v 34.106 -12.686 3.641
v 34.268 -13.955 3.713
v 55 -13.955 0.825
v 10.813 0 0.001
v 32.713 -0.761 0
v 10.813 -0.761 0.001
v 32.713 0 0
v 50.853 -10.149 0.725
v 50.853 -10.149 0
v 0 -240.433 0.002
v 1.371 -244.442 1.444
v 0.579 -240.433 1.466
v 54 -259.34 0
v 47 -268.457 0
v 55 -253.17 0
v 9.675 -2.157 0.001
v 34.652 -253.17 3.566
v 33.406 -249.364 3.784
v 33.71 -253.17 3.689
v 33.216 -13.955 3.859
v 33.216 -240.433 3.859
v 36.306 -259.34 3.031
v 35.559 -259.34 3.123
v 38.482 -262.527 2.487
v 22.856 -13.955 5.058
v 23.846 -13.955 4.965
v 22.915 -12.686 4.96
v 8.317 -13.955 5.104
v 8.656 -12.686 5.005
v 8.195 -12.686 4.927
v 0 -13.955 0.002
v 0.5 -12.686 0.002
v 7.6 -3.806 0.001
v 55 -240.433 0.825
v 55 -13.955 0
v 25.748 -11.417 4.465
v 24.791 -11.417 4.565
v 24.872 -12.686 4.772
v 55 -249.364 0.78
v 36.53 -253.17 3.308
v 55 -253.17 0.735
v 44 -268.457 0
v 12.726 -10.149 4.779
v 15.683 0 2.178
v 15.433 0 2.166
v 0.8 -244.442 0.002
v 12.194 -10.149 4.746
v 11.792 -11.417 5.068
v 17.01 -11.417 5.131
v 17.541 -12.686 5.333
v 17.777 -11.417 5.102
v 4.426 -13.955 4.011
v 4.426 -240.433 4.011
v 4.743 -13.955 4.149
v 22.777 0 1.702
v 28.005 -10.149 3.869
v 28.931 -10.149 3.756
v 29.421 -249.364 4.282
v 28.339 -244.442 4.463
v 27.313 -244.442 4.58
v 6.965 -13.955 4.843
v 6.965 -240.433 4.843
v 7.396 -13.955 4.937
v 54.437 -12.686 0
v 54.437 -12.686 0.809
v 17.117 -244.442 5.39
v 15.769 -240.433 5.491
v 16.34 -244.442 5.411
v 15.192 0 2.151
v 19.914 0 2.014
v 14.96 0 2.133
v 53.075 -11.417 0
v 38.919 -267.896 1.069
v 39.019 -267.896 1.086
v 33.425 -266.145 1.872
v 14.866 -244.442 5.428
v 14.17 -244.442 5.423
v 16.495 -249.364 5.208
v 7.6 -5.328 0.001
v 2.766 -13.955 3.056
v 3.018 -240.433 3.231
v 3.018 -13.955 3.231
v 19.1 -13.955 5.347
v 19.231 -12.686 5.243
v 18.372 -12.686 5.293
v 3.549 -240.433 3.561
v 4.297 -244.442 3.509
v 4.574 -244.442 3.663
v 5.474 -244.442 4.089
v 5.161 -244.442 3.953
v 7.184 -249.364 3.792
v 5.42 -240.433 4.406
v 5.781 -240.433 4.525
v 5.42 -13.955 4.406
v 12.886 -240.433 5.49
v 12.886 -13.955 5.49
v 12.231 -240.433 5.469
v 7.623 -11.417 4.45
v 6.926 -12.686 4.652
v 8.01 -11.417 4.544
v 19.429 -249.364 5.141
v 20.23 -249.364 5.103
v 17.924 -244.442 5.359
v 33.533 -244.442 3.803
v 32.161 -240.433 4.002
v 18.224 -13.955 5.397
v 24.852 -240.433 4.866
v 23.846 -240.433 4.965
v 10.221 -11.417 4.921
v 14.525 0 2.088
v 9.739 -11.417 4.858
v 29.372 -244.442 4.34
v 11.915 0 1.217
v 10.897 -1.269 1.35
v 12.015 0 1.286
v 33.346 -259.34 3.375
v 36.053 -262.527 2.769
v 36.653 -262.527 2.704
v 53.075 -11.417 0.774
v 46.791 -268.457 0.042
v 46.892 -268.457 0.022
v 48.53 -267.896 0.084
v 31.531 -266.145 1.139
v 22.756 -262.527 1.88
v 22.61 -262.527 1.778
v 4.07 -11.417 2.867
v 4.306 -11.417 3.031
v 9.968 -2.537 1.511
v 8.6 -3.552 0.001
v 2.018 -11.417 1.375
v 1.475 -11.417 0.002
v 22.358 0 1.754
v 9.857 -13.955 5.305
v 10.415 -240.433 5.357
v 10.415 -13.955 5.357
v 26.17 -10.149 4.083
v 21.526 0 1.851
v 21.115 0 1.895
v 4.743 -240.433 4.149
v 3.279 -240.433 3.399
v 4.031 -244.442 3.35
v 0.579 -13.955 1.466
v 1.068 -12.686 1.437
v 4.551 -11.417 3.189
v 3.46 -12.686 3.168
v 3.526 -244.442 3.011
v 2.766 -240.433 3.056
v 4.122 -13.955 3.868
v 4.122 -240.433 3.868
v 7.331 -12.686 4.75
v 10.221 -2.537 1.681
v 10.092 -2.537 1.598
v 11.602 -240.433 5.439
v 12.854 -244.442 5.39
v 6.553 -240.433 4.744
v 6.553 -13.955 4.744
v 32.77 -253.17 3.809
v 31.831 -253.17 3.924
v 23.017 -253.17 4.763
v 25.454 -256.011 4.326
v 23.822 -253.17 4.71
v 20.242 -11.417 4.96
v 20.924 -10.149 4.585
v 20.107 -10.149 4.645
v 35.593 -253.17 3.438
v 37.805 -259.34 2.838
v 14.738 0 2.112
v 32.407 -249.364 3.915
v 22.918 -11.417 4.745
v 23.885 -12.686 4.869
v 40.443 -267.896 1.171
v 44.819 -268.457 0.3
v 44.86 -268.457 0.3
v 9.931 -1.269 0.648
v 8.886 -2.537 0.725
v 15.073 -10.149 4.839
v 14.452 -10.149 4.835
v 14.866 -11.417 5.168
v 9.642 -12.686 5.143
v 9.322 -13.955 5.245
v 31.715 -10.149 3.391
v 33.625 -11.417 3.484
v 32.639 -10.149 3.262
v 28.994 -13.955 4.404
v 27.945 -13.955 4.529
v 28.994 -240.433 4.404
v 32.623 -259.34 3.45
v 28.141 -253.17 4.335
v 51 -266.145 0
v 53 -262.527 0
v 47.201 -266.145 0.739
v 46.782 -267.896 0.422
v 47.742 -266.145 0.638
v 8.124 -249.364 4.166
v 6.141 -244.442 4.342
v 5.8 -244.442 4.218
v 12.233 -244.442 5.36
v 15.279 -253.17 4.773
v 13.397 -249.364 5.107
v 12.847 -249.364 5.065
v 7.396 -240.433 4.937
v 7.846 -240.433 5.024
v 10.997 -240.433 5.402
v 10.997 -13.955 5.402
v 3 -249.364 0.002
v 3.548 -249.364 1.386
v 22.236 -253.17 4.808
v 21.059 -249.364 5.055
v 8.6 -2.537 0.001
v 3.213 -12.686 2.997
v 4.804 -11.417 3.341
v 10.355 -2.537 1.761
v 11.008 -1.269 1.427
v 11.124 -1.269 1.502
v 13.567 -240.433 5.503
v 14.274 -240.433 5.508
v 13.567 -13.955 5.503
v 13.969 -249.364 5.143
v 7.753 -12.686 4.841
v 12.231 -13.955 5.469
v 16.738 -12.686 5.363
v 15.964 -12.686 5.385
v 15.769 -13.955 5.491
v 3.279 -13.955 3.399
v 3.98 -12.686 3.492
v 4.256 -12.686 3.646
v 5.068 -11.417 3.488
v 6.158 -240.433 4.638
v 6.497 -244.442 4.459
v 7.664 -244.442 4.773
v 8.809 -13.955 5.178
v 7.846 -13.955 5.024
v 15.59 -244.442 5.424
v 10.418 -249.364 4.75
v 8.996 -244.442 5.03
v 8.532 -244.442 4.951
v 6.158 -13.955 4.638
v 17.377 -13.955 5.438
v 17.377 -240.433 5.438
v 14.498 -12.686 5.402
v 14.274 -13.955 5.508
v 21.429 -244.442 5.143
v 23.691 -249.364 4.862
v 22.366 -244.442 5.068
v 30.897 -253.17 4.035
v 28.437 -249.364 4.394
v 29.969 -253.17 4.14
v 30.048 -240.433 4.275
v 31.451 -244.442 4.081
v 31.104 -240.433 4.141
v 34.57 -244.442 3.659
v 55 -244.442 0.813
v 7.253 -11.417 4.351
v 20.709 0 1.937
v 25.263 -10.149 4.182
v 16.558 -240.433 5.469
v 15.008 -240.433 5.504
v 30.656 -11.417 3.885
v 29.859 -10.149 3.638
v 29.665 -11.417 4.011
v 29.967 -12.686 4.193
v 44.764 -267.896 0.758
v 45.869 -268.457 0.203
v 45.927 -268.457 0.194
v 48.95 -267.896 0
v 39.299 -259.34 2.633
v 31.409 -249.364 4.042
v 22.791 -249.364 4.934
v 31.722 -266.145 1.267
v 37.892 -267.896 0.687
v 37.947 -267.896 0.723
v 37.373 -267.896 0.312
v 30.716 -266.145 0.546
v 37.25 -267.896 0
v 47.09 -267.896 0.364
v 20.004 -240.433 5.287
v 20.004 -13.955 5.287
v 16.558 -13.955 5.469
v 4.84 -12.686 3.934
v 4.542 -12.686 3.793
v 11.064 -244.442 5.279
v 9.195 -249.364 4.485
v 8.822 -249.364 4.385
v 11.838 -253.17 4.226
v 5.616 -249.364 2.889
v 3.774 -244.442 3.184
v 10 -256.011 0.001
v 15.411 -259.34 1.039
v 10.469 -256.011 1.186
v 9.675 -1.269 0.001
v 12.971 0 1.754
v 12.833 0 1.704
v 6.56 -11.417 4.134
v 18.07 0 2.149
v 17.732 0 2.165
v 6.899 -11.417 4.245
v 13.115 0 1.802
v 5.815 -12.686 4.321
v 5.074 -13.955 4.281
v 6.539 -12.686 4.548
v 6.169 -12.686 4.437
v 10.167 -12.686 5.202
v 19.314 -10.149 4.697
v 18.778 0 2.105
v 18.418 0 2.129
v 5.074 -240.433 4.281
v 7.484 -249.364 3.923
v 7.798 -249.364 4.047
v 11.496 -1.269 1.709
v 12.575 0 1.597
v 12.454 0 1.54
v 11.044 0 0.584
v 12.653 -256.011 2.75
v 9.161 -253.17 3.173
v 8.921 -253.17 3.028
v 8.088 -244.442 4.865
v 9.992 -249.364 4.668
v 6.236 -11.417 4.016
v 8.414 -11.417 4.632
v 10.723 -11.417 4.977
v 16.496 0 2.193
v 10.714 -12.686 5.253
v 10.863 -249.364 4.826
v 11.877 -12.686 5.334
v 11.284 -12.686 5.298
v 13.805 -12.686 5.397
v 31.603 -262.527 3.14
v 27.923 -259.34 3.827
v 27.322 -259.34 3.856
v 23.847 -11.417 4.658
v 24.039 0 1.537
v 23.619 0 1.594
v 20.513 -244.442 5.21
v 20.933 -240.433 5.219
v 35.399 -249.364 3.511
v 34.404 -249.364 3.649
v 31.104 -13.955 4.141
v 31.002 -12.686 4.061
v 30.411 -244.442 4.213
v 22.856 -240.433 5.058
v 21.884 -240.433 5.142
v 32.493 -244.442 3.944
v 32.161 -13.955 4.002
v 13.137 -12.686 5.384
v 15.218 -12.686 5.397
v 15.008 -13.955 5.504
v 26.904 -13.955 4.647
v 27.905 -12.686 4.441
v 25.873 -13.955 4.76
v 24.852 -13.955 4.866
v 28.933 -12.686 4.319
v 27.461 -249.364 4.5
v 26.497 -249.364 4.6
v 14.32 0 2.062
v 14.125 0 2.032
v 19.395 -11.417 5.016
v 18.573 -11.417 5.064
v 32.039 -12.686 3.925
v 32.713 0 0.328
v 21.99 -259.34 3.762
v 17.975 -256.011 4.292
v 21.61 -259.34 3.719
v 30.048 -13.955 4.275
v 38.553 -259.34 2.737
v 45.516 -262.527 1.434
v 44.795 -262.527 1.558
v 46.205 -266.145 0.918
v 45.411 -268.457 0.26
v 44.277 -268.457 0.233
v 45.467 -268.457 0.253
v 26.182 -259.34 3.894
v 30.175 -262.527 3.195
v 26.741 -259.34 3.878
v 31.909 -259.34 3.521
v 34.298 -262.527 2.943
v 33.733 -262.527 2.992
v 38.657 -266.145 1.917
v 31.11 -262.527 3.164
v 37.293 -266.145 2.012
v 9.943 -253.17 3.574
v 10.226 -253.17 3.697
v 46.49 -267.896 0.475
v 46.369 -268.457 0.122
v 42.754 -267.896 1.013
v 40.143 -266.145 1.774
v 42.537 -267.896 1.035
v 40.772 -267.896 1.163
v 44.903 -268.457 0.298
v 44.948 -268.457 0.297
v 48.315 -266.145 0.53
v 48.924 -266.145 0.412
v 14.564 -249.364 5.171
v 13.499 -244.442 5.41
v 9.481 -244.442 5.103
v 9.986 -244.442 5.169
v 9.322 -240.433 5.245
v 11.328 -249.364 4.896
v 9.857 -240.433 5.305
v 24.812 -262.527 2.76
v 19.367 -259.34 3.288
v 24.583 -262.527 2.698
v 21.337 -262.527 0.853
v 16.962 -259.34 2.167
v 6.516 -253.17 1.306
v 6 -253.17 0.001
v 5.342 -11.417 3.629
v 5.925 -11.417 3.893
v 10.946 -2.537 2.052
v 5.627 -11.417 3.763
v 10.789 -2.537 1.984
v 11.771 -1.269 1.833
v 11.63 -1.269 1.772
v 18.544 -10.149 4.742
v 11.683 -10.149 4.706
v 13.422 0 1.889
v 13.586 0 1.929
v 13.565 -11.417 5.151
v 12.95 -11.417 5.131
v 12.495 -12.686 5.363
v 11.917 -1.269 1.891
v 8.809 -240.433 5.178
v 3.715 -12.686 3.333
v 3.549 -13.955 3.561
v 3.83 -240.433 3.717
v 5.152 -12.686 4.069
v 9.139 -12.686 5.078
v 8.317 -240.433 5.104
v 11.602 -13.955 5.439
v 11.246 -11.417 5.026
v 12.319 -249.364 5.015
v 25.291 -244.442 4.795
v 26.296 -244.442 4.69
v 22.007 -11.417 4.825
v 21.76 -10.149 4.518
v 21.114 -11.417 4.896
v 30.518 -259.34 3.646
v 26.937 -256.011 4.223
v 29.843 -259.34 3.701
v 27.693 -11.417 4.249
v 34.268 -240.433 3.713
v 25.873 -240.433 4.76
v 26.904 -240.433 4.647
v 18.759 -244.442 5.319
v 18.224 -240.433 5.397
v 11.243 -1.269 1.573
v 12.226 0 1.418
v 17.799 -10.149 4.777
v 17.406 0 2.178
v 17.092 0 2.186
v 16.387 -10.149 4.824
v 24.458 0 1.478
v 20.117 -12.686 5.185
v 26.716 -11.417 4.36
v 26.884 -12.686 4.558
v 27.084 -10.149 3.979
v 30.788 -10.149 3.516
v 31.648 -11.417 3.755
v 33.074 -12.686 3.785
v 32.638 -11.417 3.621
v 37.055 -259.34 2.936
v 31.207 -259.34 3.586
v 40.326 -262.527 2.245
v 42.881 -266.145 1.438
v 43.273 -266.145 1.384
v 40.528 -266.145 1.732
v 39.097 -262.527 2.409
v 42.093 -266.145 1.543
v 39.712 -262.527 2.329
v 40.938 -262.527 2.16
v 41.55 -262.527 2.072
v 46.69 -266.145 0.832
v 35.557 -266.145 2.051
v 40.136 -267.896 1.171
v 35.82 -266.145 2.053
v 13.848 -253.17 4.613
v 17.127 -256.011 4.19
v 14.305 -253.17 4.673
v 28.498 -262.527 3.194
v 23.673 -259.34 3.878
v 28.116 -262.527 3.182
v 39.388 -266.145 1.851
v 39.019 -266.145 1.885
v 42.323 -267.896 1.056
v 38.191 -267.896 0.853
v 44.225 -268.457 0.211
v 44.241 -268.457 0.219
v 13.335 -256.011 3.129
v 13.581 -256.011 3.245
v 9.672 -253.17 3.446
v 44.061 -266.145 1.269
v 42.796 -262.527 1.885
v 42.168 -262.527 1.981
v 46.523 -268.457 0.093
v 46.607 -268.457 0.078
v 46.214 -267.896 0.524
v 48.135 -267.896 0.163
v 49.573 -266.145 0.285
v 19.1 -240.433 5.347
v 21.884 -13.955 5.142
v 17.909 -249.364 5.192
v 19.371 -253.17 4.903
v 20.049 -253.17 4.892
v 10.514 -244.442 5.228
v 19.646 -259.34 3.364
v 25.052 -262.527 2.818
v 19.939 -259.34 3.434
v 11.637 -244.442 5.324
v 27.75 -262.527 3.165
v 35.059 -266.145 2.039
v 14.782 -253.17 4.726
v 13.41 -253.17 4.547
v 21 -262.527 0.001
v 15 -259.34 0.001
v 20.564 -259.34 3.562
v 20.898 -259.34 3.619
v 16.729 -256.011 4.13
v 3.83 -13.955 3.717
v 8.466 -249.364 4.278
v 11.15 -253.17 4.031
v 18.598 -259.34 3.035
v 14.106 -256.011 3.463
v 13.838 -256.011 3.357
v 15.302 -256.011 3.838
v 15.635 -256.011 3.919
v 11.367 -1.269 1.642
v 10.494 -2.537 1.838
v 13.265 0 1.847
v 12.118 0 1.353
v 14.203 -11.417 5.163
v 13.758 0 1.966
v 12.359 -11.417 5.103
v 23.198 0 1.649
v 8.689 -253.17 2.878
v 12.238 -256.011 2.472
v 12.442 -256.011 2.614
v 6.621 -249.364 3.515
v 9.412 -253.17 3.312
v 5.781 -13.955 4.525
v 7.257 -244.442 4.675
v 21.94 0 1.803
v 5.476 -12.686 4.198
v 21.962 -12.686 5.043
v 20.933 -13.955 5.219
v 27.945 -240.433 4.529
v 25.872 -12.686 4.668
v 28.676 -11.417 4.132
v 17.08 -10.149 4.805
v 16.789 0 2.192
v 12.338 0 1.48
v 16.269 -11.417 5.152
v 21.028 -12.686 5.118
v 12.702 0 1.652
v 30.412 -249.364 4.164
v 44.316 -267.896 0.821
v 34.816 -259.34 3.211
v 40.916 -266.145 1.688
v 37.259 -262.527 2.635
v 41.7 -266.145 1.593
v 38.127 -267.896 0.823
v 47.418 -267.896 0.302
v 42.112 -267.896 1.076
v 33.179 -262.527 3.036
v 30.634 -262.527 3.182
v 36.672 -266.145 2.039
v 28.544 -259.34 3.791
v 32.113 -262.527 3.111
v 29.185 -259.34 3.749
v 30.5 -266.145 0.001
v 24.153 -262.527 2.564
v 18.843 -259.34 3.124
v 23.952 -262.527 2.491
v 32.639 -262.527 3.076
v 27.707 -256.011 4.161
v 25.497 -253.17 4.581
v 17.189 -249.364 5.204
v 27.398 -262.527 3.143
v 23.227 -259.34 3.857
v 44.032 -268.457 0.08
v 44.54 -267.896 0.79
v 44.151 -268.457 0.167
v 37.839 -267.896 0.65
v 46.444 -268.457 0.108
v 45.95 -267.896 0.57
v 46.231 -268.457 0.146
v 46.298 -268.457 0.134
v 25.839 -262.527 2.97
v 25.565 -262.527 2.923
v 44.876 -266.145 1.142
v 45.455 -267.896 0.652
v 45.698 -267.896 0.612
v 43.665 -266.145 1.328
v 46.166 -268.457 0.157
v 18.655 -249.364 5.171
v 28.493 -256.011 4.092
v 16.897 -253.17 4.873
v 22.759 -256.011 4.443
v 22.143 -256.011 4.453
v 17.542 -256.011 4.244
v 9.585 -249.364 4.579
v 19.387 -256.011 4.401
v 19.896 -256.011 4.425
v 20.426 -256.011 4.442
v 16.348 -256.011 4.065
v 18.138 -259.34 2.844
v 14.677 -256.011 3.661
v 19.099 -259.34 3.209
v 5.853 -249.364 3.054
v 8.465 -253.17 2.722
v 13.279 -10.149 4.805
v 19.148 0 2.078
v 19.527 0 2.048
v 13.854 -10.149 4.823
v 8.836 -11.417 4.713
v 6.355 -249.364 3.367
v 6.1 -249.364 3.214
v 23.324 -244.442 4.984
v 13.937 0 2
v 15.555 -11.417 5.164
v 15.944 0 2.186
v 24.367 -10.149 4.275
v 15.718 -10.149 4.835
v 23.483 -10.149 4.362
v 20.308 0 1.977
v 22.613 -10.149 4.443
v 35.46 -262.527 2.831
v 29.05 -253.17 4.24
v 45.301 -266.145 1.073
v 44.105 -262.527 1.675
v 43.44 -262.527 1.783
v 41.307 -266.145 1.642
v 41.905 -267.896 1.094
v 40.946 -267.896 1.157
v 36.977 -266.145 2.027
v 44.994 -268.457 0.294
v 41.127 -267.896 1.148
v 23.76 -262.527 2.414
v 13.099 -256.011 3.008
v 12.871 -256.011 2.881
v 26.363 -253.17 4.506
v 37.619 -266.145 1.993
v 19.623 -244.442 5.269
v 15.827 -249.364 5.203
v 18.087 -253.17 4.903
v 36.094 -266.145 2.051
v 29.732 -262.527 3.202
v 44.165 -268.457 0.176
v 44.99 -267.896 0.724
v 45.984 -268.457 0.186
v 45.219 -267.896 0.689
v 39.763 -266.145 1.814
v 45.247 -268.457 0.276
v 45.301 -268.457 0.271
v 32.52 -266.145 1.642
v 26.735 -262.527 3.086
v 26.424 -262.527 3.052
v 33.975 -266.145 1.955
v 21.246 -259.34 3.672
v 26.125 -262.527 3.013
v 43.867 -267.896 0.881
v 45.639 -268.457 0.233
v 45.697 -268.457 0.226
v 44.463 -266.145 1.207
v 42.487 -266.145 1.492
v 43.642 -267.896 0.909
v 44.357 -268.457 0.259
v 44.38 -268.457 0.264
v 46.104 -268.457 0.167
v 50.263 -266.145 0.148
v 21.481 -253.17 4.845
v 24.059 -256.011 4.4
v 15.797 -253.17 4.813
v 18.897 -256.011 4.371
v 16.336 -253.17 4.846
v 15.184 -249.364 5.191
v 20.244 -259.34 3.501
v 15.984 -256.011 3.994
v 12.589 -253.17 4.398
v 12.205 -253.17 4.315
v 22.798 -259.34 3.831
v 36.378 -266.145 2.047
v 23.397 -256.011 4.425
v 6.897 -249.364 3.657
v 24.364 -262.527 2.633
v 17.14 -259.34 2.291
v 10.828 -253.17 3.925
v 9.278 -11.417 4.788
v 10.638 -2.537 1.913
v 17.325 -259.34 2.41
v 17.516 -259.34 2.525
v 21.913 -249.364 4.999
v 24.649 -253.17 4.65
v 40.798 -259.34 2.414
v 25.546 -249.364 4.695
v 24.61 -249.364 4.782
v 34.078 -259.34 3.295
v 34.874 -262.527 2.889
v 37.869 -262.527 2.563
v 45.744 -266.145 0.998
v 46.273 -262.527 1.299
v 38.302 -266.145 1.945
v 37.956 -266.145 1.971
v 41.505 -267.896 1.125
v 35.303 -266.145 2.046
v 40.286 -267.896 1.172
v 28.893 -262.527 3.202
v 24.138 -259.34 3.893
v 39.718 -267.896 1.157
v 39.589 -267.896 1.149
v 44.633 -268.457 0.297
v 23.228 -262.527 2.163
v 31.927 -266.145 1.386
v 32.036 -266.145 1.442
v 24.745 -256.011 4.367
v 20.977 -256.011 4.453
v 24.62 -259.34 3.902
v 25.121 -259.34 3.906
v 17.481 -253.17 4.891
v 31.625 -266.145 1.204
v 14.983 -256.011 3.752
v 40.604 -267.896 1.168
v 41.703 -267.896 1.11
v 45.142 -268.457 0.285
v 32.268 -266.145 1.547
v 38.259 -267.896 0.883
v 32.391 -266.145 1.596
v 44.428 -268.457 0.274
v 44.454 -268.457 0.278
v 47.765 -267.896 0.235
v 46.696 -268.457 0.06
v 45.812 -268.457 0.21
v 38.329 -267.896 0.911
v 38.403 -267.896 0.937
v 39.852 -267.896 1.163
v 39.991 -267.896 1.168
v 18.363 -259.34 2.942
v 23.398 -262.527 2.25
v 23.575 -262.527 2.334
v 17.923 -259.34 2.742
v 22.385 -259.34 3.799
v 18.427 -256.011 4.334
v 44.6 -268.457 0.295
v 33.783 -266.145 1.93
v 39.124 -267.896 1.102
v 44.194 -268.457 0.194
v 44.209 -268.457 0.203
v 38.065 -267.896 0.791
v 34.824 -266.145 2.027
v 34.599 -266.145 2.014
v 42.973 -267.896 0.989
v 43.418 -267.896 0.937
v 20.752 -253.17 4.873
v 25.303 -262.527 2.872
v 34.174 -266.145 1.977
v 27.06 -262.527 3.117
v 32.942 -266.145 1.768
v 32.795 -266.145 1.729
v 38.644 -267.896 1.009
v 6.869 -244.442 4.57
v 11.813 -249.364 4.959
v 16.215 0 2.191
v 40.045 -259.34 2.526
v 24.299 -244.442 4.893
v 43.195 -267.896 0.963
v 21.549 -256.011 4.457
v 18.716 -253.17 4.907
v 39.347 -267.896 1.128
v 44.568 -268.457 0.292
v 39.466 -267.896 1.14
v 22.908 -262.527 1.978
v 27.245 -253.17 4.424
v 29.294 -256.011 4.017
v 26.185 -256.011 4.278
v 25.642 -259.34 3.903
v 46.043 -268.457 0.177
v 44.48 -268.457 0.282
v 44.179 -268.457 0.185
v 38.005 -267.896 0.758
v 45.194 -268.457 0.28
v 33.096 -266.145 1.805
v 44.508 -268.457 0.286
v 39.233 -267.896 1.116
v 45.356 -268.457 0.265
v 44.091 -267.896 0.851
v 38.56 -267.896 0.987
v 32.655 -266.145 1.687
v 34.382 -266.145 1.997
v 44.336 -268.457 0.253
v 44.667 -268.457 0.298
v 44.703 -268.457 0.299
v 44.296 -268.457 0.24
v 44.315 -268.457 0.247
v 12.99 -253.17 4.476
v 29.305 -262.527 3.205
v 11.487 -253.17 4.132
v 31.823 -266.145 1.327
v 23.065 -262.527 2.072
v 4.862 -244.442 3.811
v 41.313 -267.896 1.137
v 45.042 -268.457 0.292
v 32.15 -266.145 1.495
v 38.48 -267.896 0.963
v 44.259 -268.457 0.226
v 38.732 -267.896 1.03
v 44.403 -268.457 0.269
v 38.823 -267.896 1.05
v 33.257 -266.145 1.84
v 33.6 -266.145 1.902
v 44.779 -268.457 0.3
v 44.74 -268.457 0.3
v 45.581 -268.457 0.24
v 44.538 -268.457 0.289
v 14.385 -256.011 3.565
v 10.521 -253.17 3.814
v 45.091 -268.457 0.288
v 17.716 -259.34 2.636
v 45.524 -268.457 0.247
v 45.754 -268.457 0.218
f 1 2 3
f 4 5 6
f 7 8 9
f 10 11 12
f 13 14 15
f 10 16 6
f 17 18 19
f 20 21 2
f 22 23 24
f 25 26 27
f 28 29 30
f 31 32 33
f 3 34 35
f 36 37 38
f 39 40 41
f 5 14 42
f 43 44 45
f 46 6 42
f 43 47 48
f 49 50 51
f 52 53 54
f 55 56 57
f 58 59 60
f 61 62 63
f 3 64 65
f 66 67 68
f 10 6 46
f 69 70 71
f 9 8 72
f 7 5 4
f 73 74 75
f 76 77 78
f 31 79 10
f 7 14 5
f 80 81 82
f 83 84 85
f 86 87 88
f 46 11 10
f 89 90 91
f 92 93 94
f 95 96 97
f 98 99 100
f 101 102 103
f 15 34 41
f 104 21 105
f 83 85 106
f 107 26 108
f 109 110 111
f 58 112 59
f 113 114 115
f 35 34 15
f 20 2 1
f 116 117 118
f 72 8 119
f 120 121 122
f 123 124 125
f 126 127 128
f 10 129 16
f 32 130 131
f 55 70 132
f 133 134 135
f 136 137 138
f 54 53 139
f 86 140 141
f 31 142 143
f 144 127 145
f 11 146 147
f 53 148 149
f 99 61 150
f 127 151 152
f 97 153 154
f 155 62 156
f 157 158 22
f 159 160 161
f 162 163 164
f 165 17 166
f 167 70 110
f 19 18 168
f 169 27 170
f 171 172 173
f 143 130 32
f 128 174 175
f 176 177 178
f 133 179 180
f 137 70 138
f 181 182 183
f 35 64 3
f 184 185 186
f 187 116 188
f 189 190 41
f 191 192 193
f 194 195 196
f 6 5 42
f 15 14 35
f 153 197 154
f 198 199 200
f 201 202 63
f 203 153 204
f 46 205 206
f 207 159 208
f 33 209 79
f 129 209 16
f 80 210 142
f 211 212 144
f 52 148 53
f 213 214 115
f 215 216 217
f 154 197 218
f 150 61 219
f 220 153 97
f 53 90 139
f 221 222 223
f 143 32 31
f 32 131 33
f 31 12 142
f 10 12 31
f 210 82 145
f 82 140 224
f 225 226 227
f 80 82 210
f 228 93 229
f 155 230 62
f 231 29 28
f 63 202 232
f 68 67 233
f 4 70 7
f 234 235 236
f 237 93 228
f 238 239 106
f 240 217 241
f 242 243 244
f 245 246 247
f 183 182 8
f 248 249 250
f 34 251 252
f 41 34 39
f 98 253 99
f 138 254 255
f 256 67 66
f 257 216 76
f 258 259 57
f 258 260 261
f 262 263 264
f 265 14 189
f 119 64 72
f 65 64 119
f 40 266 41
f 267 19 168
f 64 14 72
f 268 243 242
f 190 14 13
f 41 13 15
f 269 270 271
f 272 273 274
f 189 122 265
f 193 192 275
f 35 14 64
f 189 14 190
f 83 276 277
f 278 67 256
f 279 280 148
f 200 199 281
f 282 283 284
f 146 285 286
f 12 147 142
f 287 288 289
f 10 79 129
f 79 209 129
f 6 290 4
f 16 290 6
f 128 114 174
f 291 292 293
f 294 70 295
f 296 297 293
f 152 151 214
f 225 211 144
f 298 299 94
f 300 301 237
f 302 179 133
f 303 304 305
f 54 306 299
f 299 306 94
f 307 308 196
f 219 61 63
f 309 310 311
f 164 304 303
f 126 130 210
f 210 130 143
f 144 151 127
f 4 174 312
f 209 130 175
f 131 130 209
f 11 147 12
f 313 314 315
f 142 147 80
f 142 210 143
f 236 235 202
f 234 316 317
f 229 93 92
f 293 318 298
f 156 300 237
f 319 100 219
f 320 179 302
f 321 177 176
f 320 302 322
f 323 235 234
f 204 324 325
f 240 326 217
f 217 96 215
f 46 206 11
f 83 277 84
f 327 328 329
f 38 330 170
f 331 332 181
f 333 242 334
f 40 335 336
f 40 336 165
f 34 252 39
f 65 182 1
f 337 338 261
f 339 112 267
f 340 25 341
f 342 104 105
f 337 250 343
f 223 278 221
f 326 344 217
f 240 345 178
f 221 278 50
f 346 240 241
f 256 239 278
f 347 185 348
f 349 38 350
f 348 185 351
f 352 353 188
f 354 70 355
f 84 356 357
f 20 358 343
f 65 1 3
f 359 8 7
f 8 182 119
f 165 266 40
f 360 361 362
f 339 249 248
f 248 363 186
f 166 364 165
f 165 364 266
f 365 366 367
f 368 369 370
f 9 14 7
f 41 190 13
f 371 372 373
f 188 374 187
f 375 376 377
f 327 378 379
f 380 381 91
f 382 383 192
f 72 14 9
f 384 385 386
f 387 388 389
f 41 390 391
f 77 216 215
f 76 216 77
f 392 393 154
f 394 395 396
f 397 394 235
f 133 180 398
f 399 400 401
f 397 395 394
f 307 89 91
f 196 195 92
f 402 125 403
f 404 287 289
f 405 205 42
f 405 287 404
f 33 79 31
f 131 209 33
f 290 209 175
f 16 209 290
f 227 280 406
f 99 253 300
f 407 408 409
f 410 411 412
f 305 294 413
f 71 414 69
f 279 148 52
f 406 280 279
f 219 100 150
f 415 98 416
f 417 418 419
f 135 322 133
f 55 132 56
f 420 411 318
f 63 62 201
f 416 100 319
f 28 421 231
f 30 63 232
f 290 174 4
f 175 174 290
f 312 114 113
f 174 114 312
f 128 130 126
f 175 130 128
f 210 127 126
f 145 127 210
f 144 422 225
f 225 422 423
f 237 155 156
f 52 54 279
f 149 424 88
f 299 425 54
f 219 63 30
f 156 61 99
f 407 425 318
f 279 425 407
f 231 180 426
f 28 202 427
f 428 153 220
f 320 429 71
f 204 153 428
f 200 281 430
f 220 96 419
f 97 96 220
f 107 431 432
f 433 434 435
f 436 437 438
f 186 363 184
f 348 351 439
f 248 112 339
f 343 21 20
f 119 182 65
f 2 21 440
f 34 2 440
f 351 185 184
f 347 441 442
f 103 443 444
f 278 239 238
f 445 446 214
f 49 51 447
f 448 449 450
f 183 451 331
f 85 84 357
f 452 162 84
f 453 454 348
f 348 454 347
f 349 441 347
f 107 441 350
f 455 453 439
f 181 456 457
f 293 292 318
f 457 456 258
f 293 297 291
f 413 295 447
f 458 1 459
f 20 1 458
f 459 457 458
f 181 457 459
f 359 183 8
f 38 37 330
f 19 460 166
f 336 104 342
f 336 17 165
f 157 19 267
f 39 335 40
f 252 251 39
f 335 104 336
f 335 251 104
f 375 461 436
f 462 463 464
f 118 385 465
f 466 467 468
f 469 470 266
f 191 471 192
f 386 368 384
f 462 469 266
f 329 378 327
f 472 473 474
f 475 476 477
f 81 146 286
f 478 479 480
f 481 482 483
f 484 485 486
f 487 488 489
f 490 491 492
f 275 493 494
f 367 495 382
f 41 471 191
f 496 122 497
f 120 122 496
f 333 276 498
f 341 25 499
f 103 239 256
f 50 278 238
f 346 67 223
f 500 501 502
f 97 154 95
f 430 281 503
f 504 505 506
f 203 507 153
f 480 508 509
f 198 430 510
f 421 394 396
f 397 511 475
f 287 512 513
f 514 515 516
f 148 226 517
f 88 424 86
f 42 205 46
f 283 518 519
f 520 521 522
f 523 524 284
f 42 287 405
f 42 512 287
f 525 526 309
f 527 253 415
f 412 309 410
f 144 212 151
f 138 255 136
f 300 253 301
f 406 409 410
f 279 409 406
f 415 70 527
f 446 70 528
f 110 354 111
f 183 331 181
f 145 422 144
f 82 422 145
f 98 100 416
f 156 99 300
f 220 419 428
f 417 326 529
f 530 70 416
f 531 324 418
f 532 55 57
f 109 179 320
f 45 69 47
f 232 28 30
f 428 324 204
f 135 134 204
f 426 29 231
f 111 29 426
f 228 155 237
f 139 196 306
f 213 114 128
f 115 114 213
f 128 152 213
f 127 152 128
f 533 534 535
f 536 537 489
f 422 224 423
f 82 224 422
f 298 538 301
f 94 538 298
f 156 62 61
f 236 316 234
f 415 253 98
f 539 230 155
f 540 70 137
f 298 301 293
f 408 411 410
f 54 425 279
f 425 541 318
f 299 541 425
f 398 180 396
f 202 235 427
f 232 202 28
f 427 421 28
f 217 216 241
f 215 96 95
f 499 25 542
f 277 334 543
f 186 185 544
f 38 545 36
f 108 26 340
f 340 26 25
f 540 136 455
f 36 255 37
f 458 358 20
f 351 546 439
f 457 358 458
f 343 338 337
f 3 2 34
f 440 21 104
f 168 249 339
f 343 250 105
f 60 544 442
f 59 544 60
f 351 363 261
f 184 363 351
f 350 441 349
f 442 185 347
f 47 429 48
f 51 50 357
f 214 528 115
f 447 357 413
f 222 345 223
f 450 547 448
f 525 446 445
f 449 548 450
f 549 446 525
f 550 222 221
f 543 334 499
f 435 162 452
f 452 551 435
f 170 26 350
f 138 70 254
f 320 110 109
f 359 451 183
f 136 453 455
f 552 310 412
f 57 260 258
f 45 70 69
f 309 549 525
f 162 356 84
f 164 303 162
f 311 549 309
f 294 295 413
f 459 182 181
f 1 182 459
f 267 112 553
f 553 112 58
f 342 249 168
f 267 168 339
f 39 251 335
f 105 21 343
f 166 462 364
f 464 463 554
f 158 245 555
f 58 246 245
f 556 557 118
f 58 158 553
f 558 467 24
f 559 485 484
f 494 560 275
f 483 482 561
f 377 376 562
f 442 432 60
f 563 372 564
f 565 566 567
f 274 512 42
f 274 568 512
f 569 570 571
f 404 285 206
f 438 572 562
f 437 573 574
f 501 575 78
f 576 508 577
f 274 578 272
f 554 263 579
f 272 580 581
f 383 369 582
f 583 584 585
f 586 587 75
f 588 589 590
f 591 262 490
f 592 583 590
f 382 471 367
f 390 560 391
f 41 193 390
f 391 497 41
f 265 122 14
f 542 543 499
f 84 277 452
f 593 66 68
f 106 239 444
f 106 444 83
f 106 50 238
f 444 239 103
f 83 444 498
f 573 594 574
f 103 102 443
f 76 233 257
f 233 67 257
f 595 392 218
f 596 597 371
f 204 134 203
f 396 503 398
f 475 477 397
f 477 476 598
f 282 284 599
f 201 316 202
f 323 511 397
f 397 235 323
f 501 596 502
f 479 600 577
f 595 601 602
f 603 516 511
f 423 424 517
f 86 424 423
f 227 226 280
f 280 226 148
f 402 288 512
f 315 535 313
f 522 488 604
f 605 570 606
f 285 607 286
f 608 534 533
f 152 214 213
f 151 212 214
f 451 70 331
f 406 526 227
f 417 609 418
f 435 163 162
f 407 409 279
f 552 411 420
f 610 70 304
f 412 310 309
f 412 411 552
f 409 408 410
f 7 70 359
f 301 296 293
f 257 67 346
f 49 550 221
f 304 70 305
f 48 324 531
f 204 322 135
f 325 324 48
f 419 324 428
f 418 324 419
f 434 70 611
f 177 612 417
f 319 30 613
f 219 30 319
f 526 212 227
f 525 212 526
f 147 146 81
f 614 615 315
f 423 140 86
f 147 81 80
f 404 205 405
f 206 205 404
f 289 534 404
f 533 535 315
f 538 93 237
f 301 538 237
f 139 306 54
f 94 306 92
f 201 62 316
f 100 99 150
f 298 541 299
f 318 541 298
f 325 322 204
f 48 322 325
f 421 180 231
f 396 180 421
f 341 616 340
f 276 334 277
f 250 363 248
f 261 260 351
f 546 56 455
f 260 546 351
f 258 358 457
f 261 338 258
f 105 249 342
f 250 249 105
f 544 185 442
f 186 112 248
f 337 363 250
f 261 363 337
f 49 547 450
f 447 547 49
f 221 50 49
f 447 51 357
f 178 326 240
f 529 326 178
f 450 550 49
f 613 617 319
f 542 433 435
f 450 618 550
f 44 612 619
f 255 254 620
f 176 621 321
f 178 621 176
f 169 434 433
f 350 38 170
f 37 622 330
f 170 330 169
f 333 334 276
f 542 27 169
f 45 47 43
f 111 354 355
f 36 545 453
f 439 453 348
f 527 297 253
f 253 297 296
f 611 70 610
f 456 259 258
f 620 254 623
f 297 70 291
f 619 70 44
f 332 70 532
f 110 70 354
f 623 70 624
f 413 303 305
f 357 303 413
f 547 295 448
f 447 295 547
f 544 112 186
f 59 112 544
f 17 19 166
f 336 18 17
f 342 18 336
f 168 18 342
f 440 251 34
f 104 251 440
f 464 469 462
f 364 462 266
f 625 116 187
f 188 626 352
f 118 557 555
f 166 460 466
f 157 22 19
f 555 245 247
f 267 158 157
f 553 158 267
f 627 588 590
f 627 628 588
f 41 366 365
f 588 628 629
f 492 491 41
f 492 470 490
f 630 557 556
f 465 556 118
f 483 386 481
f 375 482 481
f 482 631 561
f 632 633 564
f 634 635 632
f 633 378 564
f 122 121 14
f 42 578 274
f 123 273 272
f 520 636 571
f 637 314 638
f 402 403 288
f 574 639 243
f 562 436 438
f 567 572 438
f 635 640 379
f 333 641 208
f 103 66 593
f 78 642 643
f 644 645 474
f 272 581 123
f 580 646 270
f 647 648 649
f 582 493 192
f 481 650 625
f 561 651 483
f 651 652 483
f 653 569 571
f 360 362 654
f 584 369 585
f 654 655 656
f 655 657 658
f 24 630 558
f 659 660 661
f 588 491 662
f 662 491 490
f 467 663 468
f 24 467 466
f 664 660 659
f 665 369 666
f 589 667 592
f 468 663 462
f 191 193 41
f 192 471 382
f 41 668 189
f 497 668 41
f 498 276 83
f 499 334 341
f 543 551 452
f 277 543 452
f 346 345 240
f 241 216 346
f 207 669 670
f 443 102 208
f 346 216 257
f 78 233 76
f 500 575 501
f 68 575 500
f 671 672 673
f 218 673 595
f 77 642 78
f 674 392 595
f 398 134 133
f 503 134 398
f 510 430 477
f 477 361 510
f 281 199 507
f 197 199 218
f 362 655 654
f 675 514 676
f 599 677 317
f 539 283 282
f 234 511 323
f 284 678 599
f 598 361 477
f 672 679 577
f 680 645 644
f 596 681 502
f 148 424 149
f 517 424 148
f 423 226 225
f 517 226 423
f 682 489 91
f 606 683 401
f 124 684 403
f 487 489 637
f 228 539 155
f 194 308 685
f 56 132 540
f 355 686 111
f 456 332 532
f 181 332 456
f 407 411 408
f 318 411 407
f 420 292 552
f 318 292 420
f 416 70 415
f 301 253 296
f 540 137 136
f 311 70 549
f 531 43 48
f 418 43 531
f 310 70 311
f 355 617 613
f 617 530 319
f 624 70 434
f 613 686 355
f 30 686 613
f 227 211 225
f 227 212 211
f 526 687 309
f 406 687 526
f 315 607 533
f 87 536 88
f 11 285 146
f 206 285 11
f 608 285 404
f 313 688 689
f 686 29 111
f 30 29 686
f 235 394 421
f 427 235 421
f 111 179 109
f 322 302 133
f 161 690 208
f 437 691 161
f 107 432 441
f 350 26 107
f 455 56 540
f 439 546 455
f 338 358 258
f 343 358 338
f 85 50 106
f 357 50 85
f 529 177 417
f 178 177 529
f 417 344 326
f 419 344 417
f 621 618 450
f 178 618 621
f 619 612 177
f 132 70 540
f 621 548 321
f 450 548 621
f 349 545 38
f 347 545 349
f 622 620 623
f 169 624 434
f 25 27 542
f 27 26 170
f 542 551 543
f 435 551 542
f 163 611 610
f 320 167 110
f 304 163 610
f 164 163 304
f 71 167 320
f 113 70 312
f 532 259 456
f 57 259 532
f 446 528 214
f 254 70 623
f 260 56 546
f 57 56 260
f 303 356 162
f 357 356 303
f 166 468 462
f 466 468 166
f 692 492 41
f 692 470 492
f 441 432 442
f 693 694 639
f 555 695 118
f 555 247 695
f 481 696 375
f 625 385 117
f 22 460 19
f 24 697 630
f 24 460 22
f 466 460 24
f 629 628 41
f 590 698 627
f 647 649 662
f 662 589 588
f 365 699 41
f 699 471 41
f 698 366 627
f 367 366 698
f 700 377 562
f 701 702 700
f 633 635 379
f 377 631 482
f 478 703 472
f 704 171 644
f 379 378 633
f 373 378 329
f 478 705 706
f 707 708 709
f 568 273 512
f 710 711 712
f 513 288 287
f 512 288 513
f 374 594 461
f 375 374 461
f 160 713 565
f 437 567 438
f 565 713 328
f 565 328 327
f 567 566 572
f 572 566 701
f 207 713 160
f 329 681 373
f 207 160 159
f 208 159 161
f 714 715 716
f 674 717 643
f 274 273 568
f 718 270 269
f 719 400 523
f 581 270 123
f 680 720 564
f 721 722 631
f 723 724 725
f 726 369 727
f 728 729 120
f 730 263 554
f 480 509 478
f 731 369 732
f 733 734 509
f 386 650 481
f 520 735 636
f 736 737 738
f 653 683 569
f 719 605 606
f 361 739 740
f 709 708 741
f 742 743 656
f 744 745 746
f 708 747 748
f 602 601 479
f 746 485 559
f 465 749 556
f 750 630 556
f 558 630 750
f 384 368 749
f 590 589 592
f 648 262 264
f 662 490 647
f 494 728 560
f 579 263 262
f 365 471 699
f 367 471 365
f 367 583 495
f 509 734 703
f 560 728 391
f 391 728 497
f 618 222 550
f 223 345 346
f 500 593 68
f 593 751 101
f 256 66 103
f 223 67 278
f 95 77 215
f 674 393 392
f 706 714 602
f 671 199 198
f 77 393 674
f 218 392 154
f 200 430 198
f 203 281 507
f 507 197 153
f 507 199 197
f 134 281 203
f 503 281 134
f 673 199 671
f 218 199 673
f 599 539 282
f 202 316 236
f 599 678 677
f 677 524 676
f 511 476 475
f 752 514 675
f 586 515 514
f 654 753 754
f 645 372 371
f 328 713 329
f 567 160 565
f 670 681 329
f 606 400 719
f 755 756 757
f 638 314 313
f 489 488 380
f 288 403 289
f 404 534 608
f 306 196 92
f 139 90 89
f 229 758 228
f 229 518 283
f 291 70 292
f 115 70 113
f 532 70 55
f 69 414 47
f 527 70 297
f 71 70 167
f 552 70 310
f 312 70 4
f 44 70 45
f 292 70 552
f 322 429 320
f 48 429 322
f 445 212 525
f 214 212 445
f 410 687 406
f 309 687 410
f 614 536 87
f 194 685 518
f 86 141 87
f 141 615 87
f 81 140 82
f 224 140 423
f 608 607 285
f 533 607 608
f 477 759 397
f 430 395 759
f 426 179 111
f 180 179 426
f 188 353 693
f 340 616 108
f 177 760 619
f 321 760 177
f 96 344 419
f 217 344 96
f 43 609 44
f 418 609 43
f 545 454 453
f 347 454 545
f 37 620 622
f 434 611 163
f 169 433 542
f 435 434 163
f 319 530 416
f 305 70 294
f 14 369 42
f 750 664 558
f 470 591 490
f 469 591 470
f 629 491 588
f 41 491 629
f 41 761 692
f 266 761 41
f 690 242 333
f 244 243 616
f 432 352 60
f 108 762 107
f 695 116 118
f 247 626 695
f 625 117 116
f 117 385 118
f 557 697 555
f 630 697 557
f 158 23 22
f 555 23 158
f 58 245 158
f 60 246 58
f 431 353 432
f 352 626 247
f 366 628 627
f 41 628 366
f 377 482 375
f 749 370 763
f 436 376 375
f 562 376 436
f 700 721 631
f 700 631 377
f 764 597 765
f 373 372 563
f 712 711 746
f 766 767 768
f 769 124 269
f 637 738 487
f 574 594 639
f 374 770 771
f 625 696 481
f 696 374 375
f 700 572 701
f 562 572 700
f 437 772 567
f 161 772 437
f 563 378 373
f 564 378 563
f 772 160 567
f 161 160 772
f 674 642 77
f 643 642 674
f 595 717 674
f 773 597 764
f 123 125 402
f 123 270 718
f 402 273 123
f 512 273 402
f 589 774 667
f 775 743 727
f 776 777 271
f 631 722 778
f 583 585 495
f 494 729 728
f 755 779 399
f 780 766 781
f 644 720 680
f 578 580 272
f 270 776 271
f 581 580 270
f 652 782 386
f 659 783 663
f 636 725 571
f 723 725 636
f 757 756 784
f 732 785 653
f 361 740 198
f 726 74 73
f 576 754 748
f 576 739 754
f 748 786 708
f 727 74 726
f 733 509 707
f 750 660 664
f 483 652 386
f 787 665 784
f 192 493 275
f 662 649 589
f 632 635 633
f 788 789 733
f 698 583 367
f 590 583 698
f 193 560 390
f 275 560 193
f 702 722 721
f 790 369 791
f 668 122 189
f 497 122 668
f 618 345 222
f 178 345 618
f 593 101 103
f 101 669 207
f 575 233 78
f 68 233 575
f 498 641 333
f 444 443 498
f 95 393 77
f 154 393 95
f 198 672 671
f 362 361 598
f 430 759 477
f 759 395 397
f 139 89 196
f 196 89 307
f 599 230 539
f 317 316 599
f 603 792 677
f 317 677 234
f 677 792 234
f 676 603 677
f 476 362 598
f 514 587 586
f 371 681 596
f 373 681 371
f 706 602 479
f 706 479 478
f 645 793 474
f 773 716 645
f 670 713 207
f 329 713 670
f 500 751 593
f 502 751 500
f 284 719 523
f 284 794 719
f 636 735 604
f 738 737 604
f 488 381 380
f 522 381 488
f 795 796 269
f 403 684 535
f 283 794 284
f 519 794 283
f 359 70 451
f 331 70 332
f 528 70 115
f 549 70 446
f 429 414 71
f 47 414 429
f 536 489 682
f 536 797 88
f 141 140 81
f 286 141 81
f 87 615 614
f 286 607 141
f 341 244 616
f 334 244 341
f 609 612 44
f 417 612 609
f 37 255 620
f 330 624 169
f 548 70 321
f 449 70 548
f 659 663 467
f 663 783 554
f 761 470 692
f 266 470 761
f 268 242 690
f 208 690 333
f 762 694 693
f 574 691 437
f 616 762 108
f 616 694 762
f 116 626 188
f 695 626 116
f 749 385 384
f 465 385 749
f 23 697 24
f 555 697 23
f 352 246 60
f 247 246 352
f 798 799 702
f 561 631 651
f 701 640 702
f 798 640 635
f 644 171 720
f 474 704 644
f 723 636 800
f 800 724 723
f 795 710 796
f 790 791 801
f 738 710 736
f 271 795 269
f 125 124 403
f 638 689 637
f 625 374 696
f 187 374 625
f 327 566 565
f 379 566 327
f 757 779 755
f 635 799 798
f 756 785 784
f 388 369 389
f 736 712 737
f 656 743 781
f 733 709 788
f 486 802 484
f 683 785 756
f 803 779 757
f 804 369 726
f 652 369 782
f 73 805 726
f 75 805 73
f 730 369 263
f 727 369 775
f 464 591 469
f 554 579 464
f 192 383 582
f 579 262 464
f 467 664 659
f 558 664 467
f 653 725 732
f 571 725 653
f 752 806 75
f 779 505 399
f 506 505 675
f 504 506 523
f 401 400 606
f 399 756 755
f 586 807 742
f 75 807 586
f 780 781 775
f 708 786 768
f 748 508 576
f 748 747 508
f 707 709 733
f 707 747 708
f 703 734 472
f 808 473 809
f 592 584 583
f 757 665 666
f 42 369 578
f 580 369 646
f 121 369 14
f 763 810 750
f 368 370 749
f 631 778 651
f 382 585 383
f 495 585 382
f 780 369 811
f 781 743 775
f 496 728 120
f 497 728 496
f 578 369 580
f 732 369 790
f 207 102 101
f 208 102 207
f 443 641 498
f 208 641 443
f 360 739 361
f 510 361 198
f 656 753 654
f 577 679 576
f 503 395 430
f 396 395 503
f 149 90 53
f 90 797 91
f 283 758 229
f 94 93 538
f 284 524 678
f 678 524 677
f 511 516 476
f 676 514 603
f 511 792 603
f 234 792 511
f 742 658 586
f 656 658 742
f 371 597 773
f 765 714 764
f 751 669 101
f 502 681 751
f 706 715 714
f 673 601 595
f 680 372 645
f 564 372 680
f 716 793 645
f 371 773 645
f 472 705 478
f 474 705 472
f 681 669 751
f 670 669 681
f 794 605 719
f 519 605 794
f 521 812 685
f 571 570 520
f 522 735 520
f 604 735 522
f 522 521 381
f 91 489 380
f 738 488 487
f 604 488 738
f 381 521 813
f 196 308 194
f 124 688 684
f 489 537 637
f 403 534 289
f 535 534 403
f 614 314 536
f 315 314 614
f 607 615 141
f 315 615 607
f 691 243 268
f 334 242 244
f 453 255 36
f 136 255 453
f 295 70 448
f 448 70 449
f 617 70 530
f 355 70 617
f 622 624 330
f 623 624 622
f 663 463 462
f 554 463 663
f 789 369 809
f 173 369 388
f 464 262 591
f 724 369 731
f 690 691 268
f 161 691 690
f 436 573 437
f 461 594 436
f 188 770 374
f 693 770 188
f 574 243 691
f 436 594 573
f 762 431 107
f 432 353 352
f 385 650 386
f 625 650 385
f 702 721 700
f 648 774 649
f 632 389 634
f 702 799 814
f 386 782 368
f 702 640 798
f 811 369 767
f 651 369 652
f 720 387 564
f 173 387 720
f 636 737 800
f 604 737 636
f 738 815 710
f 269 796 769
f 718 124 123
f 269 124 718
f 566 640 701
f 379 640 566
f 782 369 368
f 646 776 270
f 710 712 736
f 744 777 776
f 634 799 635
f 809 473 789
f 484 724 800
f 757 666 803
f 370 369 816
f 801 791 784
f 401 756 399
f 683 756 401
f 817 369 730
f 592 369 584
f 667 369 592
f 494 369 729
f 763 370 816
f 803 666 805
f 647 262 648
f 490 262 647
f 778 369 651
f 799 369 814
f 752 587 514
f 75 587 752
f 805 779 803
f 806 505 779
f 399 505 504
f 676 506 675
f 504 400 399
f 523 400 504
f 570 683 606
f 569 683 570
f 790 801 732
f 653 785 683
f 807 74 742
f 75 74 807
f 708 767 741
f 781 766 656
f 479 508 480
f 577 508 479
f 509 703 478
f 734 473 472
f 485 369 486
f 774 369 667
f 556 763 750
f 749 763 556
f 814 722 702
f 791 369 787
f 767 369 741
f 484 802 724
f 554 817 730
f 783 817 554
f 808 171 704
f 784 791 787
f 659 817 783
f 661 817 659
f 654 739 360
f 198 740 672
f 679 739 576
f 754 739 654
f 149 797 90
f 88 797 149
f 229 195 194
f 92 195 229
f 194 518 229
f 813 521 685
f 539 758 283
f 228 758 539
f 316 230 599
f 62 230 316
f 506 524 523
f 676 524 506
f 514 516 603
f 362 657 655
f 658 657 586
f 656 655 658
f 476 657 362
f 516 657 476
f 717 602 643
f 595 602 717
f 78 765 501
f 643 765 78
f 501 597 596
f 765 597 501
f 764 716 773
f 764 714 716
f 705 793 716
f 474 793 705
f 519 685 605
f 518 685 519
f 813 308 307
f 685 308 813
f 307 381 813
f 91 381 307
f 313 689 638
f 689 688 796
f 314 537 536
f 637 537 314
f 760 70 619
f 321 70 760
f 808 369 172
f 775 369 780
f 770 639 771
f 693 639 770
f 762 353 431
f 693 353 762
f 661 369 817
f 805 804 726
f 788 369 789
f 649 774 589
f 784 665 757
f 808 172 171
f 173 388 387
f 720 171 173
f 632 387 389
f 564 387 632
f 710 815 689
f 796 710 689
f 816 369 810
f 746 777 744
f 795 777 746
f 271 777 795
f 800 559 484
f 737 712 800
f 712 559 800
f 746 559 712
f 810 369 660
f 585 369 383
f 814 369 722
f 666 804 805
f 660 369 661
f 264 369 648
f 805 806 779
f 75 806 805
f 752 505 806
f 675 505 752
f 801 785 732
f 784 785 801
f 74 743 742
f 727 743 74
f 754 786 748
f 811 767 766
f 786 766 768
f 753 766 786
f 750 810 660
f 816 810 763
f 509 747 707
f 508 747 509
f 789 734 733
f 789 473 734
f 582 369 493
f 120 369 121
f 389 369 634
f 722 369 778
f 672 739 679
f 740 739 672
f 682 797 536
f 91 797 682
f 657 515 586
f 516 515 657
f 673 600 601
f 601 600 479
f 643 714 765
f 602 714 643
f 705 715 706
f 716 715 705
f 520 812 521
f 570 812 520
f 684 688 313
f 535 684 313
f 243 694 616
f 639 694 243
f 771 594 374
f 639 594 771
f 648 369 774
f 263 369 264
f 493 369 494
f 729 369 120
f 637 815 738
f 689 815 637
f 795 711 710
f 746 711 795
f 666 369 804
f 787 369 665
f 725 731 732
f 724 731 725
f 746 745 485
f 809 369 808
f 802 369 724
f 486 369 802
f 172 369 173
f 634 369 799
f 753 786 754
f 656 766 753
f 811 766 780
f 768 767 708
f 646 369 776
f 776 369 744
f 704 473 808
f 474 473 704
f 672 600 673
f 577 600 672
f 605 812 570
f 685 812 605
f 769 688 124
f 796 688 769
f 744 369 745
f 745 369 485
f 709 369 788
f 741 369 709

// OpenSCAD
module foil(translateY, translateX, x, foilLength) {
    translate([translateX,-translateY,0]) {
        rotate([90,0,0]) {   
            linear_extrude(foilLength) {
                polygon(points=[
                    [	x*	1.00000	,	x*	0.00000	]	,
                     [	x*	1.00000	,	x*	0.01500	]	,
                    [	x*	0.96407	,	x*	0.00722	]	,
                    [	x*	0.93037	,	x*	0.01391	]	,
                    [	x*	0.89874	,	x*	0.02010	]	,
                    [	x*	0.86902	,	x*	0.02584	]	,
                    [	x*	0.84106	,	x*	0.03114	]	,
                    [	x*	0.81469	,	x*	0.03605	]	,
                    [	x*	0.78977	,	x*	0.04059	]	,
                    [	x*	0.76612	,	x*	0.04480	]	,
                    [	x*	0.74359	,	x*	0.04870	]	,
                    [	x*	0.72202	,	x*	0.05233	]	,
                    [	x*	0.70126	,	x*	0.05572	]	,
                    [	x*	0.68114	,	x*	0.05890	]	,
                    [	x*	0.66150	,	x*	0.06191	]	,
                    [	x*	0.64219	,	x*	0.06476	]	,
                    [	x*	0.62306	,	x*	0.06751	]	,
                    [	x*	0.60393	,	x*	0.07017	]	,
                    [	x*	0.58474	,	x*	0.07277	]	,
                    [	x*	0.56552	,	x*	0.07529	]	,
                    [	x*	0.54632	,	x*	0.07773	]	,
                    [	x*	0.52716	,	x*	0.08008	]	,
                    [	x*	0.50810	,	x*	0.08234	]	,
                    [	x*	0.48917	,	x*	0.08450	]	,
                    [	x*	0.47041	,	x*	0.08654	]	,
                    [	x*	0.45186	,	x*	0.08847	]	,
                    [	x*	0.43357	,	x*	0.09028	]	,
                    [	x*	0.41557	,	x*	0.09196	]	,
                    [	x*	0.39790	,	x*	0.09350	]	,
                    [	x*	0.38060	,	x*	0.09489	]	,
                    [	x*	0.36371	,	x*	0.09613	]	,
                    [	x*	0.34728	,	x*	0.09721	]	,
                    [	x*	0.33135	,	x*	0.09813	]	,
                    [	x*	0.31594	,	x*	0.09887	]	,
                    [	x*	0.30106	,	x*	0.09944	]	,
                    [	x*	0.28671	,	x*	0.09984	]	,
                    [	x*	0.27287	,	x*	0.10007	]	,
                    [	x*	0.25952	,	x*	0.10015	]	,
                    [	x*	0.24667	,	x*	0.10006	]	,
                    [	x*	0.23430	,	x*	0.09982	]	,
                    [	x*	0.22239	,	x*	0.09944	]	,
                    [	x*	0.21094	,	x*	0.09890	]	,
                    [	x*	0.19994	,	x*	0.09822	]	,
                    [	x*	0.18937	,	x*	0.09740	]	,
                    [	x*	0.17922	,	x*	0.09645	]	,
                    [	x*	0.16949	,	x*	0.09536	]	,
                    [	x*	0.16016	,	x*	0.09415	]	,
                    [	x*	0.15122	,	x*	0.09280	]	,
                    [	x*	0.14266	,	x*	0.09134	]	,
                    [	x*	0.13447	,	x*	0.08976	]	,
                    [	x*	0.12664	,	x*	0.08806	]	,
                    [	x*	0.11914	,	x*	0.08625	]	,
                    [	x*	0.11197	,	x*	0.08432	]	,
                    [	x*	0.10511	,	x*	0.08227	]	,
                    [	x*	0.09854	,	x*	0.08011	]	,
                    [	x*	0.09226	,	x*	0.07783	]	,
                    [	x*	0.08624	,	x*	0.07544	]	,
                    [	x*	0.08047	,	x*	0.07293	]	,
                    [	x*	0.07494	,	x*	0.07032	]	,
                    [	x*	0.06963	,	x*	0.06759	]	,
                    [	x*	0.06452	,	x*	0.06475	]	,
                    [	x*	0.05961	,	x*	0.06180	]	,
                    [	x*	0.05487	,	x*	0.05874	]	,
                    [	x*	0.05030	,	x*	0.05556	]	,
                    [	x*	0.04588	,	x*	0.05229	]	,
                    [	x*	0.04160	,	x*	0.04891	]	,
                    [	x*	0.03747	,	x*	0.04545	]	,
                    [	x*	0.03350	,	x*	0.04192	]	,
                    [	x*	0.02969	,	x*	0.03834	]	,
                    [	x*	0.02605	,	x*	0.03472	]	,
                    [	x*	0.02258	,	x*	0.03109	]	,
                    [	x*	0.01929	,	x*	0.02745	]	,
                    [	x*	0.01618	,	x*	0.02382	]	,
                    [	x*	0.01326	,	x*	0.02021	]	,
                    [	x*	0.01053	,	x*	0.02665	]	,
                    [	x*	0.00800	,	x*	0.01315	]	,
                    [	x*	0.00568	,	x*	0.00972	]	,
                    [	x*	0.00357	,	x*	0.00638	]	,
                    [	x*	0.00167	,	x*	0.00314	]	,
                    [	x*	0.00000	,	x*	0.00003	]	
                ]);
            }
        }
    }
}

module foilTip(translateY, translateX, x, foilLength) {
    translate([translateX,-translateY,0]) {
        rotate([90,0,0]) {   
            linear_extrude(foilLength) {
                polygon(points=[
                    [	x*	1.00000	,	x*	0.00000	]	,
                    
                    [	x*	0.96407	,	x*	0.00722	]	,
                    [	x*	0.93037	,	x*	0.01391	]	,
                    [	x*	0.89874	,	x*	0.02010	]	,
                    [	x*	0.86902	,	x*	0.02584	]	,
                    [	x*	0.84106	,	x*	0.03114	]	,
                    [	x*	0.81469	,	x*	0.03605	]	,
                    [	x*	0.78977	,	x*	0.04059	]	,
                    [	x*	0.76612	,	x*	0.04480	]	,
                    [	x*	0.74359	,	x*	0.04870	]	,
                    [	x*	0.72202	,	x*	0.05233	]	,
                    [	x*	0.70126	,	x*	0.05572	]	,
                    [	x*	0.68114	,	x*	0.05890	]	,
                    [	x*	0.66150	,	x*	0.06191	]	,
                    [	x*	0.64219	,	x*	0.06476	]	,
                    [	x*	0.62306	,	x*	0.06751	]	,
                    [	x*	0.60393	,	x*	0.07017	]	,
                    [	x*	0.58474	,	x*	0.07277	]	,
                    [	x*	0.56552	,	x*	0.07529	]	,
                    [	x*	0.54632	,	x*	0.07773	]	,
                    [	x*	0.52716	,	x*	0.08008	]	,
                    [	x*	0.50810	,	x*	0.08234	]	,
                    [	x*	0.48917	,	x*	0.08450	]	,
                    [	x*	0.47041	,	x*	0.08654	]	,
                    [	x*	0.45186	,	x*	0.08847	]	,
                    [	x*	0.43357	,	x*	0.09028	]	,
                    [	x*	0.41557	,	x*	0.09196	]	,
                    [	x*	0.39790	,	x*	0.09350	]	,
                    [	x*	0.38060	,	x*	0.09489	]	,
                    [	x*	0.36371	,	x*	0.09613	]	,
                    [	x*	0.34728	,	x*	0.09721	]	,
                    [	x*	0.33135	,	x*	0.09813	]	,
                    [	x*	0.31594	,	x*	0.09887	]	,
                    [	x*	0.30106	,	x*	0.09944	]	,
                    [	x*	0.28671	,	x*	0.09984	]	,
                    [	x*	0.27287	,	x*	0.10007	]	,
                    [	x*	0.25952	,	x*	0.10015	]	,
                    [	x*	0.24667	,	x*	0.10006	]	,
                    [	x*	0.23430	,	x*	0.09982	]	,
                    [	x*	0.22239	,	x*	0.09944	]	,
                    [	x*	0.21094	,	x*	0.09890	]	,
                    [	x*	0.19994	,	x*	0.09822	]	,
                    [	x*	0.18937	,	x*	0.09740	]	,
                    [	x*	0.17922	,	x*	0.09645	]	,
                    [	x*	0.16949	,	x*	0.09536	]	,
                    [	x*	0.16016	,	x*	0.09415	]	,
                    [	x*	0.15122	,	x*	0.09280	]	,
                    [	x*	0.14266	,	x*	0.09134	]	,
                    [	x*	0.13447	,	x*	0.08976	]	,
                    [	x*	0.12664	,	x*	0.08806	]	,
                    [	x*	0.11914	,	x*	0.08625	]	,
                    [	x*	0.11197	,	x*	0.08432	]	,
                    [	x*	0.10511	,	x*	0.08227	]	,
                    [	x*	0.09854	,	x*	0.08011	]	,
                    [	x*	0.09226	,	x*	0.07783	]	,
                    [	x*	0.08624	,	x*	0.07544	]	,
                    [	x*	0.08047	,	x*	0.07293	]	,
                    [	x*	0.07494	,	x*	0.07032	]	,
                    [	x*	0.06963	,	x*	0.06759	]	,
                    [	x*	0.06452	,	x*	0.06475	]	,
                    [	x*	0.05961	,	x*	0.06180	]	,
                    [	x*	0.05487	,	x*	0.05874	]	,
                    [	x*	0.05030	,	x*	0.05556	]	,
                    [	x*	0.04588	,	x*	0.05229	]	,
                    [	x*	0.04160	,	x*	0.04891	]	,
                    [	x*	0.03747	,	x*	0.04545	]	,
                    [	x*	0.03350	,	x*	0.04192	]	,
                    [	x*	0.02969	,	x*	0.03834	]	,
                    [	x*	0.02605	,	x*	0.03472	]	,
                    [	x*	0.02258	,	x*	0.03109	]	,
                    [	x*	0.01929	,	x*	0.02745	]	,
                    [	x*	0.01618	,	x*	0.02382	]	,
                    [	x*	0.01326	,	x*	0.02021	]	,
                    [	x*	0.01053	,	x*	0.02665	]	,
                    [	x*	0.00800	,	x*	0.01315	]	,
                    [	x*	0.00568	,	x*	0.00972	]	,
                    [	x*	0.00357	,	x*	0.00638	]	,
                    [	x*	0.00167	,	x*	0.00314	]	,
                    [	x*	0.00000	,	x*	0.00003	]	
                ]);
            }
        }
    }
}
translate([0,6.34303,0]) {
    hull() {
        foil(	1000*	0.00634303	,	1000*	0.010813	,	1000*	0.0219	,	100*	0.00761164	);
        foil(	1000*	0.00761164	,	1000*	0.009675	,	1000*	0.0243	,	100*	0.00888024	);
        foil(	1000*	0.00888024	,	1000*	0.0086	,	1000*	0.0272	,	100*	0.0101488	);
        foil(	1000*	0.0101488	,	1000*	0.0076	,	1000*	0.0301	,	100*	0.0152233	);
        foil(	1000*	0.0152233	,	1000*	0.00355	,	1000*	0.0445	,	100*	0.0164919	);
        foil(	1000*	0.0164919	,	1000*	0.002533	,	1000*	0.04832	,	100*	0.0177605	);
        foil(	1000*	0.0177605	,	1000*	0.001475	,	1000*	0.0516	,	100*	0.0190291	);
        foil(	1000*	0.0190291	,	1000*	0.0005	,	1000*	0.053937	,	100*	0.0202977	);
        foil(	1000*	0.0202977	,	1000*	0	,	1000*	0.055	,	100*	0.224019	);
        foil(	1000*	0.224019	,	1000*	0	,	1000*	0.055	,	100*	0.227571	);
        foil(	1000*	0.227571	,	1000*	0.0008	,	1000*	0.0542	,	100*	0.232138	);
        foil(	1000*	0.232138	,	1000*	0.003	,	1000*	0.052	,	100*	0.23569	);
        foil(	1000*	0.23569	,	1000*	0.006	,	1000*	0.049	,	100*	0.238227	);
        foilTip(	1000*	0.238227	,	1000*	0.01	,	1000*	0.0445	,	100*	0.241272	);
        foilTip(	1000*	0.241272	,	1000*	0.015	,	1000*	0.039	,	100*	0.244114	);
        foilTip(	1000*	0.244114	,	1000*	0.021	,	1000*	0.032	,	100*	0.247564	);
        foilTip(	1000*	0.247564	,	1000*	0.0305	,	1000*	0.0205	,	100*	0.249239	);
        foilTip(	1000*	0.249239	,	1000*	0.03725	,	1000*	0.0117	,	100*	0.25	);
        foilTip(	1000*	0.25	,	1000*	0.044	,	1000*	0.003	,	100*	0.248	);
    }
}
